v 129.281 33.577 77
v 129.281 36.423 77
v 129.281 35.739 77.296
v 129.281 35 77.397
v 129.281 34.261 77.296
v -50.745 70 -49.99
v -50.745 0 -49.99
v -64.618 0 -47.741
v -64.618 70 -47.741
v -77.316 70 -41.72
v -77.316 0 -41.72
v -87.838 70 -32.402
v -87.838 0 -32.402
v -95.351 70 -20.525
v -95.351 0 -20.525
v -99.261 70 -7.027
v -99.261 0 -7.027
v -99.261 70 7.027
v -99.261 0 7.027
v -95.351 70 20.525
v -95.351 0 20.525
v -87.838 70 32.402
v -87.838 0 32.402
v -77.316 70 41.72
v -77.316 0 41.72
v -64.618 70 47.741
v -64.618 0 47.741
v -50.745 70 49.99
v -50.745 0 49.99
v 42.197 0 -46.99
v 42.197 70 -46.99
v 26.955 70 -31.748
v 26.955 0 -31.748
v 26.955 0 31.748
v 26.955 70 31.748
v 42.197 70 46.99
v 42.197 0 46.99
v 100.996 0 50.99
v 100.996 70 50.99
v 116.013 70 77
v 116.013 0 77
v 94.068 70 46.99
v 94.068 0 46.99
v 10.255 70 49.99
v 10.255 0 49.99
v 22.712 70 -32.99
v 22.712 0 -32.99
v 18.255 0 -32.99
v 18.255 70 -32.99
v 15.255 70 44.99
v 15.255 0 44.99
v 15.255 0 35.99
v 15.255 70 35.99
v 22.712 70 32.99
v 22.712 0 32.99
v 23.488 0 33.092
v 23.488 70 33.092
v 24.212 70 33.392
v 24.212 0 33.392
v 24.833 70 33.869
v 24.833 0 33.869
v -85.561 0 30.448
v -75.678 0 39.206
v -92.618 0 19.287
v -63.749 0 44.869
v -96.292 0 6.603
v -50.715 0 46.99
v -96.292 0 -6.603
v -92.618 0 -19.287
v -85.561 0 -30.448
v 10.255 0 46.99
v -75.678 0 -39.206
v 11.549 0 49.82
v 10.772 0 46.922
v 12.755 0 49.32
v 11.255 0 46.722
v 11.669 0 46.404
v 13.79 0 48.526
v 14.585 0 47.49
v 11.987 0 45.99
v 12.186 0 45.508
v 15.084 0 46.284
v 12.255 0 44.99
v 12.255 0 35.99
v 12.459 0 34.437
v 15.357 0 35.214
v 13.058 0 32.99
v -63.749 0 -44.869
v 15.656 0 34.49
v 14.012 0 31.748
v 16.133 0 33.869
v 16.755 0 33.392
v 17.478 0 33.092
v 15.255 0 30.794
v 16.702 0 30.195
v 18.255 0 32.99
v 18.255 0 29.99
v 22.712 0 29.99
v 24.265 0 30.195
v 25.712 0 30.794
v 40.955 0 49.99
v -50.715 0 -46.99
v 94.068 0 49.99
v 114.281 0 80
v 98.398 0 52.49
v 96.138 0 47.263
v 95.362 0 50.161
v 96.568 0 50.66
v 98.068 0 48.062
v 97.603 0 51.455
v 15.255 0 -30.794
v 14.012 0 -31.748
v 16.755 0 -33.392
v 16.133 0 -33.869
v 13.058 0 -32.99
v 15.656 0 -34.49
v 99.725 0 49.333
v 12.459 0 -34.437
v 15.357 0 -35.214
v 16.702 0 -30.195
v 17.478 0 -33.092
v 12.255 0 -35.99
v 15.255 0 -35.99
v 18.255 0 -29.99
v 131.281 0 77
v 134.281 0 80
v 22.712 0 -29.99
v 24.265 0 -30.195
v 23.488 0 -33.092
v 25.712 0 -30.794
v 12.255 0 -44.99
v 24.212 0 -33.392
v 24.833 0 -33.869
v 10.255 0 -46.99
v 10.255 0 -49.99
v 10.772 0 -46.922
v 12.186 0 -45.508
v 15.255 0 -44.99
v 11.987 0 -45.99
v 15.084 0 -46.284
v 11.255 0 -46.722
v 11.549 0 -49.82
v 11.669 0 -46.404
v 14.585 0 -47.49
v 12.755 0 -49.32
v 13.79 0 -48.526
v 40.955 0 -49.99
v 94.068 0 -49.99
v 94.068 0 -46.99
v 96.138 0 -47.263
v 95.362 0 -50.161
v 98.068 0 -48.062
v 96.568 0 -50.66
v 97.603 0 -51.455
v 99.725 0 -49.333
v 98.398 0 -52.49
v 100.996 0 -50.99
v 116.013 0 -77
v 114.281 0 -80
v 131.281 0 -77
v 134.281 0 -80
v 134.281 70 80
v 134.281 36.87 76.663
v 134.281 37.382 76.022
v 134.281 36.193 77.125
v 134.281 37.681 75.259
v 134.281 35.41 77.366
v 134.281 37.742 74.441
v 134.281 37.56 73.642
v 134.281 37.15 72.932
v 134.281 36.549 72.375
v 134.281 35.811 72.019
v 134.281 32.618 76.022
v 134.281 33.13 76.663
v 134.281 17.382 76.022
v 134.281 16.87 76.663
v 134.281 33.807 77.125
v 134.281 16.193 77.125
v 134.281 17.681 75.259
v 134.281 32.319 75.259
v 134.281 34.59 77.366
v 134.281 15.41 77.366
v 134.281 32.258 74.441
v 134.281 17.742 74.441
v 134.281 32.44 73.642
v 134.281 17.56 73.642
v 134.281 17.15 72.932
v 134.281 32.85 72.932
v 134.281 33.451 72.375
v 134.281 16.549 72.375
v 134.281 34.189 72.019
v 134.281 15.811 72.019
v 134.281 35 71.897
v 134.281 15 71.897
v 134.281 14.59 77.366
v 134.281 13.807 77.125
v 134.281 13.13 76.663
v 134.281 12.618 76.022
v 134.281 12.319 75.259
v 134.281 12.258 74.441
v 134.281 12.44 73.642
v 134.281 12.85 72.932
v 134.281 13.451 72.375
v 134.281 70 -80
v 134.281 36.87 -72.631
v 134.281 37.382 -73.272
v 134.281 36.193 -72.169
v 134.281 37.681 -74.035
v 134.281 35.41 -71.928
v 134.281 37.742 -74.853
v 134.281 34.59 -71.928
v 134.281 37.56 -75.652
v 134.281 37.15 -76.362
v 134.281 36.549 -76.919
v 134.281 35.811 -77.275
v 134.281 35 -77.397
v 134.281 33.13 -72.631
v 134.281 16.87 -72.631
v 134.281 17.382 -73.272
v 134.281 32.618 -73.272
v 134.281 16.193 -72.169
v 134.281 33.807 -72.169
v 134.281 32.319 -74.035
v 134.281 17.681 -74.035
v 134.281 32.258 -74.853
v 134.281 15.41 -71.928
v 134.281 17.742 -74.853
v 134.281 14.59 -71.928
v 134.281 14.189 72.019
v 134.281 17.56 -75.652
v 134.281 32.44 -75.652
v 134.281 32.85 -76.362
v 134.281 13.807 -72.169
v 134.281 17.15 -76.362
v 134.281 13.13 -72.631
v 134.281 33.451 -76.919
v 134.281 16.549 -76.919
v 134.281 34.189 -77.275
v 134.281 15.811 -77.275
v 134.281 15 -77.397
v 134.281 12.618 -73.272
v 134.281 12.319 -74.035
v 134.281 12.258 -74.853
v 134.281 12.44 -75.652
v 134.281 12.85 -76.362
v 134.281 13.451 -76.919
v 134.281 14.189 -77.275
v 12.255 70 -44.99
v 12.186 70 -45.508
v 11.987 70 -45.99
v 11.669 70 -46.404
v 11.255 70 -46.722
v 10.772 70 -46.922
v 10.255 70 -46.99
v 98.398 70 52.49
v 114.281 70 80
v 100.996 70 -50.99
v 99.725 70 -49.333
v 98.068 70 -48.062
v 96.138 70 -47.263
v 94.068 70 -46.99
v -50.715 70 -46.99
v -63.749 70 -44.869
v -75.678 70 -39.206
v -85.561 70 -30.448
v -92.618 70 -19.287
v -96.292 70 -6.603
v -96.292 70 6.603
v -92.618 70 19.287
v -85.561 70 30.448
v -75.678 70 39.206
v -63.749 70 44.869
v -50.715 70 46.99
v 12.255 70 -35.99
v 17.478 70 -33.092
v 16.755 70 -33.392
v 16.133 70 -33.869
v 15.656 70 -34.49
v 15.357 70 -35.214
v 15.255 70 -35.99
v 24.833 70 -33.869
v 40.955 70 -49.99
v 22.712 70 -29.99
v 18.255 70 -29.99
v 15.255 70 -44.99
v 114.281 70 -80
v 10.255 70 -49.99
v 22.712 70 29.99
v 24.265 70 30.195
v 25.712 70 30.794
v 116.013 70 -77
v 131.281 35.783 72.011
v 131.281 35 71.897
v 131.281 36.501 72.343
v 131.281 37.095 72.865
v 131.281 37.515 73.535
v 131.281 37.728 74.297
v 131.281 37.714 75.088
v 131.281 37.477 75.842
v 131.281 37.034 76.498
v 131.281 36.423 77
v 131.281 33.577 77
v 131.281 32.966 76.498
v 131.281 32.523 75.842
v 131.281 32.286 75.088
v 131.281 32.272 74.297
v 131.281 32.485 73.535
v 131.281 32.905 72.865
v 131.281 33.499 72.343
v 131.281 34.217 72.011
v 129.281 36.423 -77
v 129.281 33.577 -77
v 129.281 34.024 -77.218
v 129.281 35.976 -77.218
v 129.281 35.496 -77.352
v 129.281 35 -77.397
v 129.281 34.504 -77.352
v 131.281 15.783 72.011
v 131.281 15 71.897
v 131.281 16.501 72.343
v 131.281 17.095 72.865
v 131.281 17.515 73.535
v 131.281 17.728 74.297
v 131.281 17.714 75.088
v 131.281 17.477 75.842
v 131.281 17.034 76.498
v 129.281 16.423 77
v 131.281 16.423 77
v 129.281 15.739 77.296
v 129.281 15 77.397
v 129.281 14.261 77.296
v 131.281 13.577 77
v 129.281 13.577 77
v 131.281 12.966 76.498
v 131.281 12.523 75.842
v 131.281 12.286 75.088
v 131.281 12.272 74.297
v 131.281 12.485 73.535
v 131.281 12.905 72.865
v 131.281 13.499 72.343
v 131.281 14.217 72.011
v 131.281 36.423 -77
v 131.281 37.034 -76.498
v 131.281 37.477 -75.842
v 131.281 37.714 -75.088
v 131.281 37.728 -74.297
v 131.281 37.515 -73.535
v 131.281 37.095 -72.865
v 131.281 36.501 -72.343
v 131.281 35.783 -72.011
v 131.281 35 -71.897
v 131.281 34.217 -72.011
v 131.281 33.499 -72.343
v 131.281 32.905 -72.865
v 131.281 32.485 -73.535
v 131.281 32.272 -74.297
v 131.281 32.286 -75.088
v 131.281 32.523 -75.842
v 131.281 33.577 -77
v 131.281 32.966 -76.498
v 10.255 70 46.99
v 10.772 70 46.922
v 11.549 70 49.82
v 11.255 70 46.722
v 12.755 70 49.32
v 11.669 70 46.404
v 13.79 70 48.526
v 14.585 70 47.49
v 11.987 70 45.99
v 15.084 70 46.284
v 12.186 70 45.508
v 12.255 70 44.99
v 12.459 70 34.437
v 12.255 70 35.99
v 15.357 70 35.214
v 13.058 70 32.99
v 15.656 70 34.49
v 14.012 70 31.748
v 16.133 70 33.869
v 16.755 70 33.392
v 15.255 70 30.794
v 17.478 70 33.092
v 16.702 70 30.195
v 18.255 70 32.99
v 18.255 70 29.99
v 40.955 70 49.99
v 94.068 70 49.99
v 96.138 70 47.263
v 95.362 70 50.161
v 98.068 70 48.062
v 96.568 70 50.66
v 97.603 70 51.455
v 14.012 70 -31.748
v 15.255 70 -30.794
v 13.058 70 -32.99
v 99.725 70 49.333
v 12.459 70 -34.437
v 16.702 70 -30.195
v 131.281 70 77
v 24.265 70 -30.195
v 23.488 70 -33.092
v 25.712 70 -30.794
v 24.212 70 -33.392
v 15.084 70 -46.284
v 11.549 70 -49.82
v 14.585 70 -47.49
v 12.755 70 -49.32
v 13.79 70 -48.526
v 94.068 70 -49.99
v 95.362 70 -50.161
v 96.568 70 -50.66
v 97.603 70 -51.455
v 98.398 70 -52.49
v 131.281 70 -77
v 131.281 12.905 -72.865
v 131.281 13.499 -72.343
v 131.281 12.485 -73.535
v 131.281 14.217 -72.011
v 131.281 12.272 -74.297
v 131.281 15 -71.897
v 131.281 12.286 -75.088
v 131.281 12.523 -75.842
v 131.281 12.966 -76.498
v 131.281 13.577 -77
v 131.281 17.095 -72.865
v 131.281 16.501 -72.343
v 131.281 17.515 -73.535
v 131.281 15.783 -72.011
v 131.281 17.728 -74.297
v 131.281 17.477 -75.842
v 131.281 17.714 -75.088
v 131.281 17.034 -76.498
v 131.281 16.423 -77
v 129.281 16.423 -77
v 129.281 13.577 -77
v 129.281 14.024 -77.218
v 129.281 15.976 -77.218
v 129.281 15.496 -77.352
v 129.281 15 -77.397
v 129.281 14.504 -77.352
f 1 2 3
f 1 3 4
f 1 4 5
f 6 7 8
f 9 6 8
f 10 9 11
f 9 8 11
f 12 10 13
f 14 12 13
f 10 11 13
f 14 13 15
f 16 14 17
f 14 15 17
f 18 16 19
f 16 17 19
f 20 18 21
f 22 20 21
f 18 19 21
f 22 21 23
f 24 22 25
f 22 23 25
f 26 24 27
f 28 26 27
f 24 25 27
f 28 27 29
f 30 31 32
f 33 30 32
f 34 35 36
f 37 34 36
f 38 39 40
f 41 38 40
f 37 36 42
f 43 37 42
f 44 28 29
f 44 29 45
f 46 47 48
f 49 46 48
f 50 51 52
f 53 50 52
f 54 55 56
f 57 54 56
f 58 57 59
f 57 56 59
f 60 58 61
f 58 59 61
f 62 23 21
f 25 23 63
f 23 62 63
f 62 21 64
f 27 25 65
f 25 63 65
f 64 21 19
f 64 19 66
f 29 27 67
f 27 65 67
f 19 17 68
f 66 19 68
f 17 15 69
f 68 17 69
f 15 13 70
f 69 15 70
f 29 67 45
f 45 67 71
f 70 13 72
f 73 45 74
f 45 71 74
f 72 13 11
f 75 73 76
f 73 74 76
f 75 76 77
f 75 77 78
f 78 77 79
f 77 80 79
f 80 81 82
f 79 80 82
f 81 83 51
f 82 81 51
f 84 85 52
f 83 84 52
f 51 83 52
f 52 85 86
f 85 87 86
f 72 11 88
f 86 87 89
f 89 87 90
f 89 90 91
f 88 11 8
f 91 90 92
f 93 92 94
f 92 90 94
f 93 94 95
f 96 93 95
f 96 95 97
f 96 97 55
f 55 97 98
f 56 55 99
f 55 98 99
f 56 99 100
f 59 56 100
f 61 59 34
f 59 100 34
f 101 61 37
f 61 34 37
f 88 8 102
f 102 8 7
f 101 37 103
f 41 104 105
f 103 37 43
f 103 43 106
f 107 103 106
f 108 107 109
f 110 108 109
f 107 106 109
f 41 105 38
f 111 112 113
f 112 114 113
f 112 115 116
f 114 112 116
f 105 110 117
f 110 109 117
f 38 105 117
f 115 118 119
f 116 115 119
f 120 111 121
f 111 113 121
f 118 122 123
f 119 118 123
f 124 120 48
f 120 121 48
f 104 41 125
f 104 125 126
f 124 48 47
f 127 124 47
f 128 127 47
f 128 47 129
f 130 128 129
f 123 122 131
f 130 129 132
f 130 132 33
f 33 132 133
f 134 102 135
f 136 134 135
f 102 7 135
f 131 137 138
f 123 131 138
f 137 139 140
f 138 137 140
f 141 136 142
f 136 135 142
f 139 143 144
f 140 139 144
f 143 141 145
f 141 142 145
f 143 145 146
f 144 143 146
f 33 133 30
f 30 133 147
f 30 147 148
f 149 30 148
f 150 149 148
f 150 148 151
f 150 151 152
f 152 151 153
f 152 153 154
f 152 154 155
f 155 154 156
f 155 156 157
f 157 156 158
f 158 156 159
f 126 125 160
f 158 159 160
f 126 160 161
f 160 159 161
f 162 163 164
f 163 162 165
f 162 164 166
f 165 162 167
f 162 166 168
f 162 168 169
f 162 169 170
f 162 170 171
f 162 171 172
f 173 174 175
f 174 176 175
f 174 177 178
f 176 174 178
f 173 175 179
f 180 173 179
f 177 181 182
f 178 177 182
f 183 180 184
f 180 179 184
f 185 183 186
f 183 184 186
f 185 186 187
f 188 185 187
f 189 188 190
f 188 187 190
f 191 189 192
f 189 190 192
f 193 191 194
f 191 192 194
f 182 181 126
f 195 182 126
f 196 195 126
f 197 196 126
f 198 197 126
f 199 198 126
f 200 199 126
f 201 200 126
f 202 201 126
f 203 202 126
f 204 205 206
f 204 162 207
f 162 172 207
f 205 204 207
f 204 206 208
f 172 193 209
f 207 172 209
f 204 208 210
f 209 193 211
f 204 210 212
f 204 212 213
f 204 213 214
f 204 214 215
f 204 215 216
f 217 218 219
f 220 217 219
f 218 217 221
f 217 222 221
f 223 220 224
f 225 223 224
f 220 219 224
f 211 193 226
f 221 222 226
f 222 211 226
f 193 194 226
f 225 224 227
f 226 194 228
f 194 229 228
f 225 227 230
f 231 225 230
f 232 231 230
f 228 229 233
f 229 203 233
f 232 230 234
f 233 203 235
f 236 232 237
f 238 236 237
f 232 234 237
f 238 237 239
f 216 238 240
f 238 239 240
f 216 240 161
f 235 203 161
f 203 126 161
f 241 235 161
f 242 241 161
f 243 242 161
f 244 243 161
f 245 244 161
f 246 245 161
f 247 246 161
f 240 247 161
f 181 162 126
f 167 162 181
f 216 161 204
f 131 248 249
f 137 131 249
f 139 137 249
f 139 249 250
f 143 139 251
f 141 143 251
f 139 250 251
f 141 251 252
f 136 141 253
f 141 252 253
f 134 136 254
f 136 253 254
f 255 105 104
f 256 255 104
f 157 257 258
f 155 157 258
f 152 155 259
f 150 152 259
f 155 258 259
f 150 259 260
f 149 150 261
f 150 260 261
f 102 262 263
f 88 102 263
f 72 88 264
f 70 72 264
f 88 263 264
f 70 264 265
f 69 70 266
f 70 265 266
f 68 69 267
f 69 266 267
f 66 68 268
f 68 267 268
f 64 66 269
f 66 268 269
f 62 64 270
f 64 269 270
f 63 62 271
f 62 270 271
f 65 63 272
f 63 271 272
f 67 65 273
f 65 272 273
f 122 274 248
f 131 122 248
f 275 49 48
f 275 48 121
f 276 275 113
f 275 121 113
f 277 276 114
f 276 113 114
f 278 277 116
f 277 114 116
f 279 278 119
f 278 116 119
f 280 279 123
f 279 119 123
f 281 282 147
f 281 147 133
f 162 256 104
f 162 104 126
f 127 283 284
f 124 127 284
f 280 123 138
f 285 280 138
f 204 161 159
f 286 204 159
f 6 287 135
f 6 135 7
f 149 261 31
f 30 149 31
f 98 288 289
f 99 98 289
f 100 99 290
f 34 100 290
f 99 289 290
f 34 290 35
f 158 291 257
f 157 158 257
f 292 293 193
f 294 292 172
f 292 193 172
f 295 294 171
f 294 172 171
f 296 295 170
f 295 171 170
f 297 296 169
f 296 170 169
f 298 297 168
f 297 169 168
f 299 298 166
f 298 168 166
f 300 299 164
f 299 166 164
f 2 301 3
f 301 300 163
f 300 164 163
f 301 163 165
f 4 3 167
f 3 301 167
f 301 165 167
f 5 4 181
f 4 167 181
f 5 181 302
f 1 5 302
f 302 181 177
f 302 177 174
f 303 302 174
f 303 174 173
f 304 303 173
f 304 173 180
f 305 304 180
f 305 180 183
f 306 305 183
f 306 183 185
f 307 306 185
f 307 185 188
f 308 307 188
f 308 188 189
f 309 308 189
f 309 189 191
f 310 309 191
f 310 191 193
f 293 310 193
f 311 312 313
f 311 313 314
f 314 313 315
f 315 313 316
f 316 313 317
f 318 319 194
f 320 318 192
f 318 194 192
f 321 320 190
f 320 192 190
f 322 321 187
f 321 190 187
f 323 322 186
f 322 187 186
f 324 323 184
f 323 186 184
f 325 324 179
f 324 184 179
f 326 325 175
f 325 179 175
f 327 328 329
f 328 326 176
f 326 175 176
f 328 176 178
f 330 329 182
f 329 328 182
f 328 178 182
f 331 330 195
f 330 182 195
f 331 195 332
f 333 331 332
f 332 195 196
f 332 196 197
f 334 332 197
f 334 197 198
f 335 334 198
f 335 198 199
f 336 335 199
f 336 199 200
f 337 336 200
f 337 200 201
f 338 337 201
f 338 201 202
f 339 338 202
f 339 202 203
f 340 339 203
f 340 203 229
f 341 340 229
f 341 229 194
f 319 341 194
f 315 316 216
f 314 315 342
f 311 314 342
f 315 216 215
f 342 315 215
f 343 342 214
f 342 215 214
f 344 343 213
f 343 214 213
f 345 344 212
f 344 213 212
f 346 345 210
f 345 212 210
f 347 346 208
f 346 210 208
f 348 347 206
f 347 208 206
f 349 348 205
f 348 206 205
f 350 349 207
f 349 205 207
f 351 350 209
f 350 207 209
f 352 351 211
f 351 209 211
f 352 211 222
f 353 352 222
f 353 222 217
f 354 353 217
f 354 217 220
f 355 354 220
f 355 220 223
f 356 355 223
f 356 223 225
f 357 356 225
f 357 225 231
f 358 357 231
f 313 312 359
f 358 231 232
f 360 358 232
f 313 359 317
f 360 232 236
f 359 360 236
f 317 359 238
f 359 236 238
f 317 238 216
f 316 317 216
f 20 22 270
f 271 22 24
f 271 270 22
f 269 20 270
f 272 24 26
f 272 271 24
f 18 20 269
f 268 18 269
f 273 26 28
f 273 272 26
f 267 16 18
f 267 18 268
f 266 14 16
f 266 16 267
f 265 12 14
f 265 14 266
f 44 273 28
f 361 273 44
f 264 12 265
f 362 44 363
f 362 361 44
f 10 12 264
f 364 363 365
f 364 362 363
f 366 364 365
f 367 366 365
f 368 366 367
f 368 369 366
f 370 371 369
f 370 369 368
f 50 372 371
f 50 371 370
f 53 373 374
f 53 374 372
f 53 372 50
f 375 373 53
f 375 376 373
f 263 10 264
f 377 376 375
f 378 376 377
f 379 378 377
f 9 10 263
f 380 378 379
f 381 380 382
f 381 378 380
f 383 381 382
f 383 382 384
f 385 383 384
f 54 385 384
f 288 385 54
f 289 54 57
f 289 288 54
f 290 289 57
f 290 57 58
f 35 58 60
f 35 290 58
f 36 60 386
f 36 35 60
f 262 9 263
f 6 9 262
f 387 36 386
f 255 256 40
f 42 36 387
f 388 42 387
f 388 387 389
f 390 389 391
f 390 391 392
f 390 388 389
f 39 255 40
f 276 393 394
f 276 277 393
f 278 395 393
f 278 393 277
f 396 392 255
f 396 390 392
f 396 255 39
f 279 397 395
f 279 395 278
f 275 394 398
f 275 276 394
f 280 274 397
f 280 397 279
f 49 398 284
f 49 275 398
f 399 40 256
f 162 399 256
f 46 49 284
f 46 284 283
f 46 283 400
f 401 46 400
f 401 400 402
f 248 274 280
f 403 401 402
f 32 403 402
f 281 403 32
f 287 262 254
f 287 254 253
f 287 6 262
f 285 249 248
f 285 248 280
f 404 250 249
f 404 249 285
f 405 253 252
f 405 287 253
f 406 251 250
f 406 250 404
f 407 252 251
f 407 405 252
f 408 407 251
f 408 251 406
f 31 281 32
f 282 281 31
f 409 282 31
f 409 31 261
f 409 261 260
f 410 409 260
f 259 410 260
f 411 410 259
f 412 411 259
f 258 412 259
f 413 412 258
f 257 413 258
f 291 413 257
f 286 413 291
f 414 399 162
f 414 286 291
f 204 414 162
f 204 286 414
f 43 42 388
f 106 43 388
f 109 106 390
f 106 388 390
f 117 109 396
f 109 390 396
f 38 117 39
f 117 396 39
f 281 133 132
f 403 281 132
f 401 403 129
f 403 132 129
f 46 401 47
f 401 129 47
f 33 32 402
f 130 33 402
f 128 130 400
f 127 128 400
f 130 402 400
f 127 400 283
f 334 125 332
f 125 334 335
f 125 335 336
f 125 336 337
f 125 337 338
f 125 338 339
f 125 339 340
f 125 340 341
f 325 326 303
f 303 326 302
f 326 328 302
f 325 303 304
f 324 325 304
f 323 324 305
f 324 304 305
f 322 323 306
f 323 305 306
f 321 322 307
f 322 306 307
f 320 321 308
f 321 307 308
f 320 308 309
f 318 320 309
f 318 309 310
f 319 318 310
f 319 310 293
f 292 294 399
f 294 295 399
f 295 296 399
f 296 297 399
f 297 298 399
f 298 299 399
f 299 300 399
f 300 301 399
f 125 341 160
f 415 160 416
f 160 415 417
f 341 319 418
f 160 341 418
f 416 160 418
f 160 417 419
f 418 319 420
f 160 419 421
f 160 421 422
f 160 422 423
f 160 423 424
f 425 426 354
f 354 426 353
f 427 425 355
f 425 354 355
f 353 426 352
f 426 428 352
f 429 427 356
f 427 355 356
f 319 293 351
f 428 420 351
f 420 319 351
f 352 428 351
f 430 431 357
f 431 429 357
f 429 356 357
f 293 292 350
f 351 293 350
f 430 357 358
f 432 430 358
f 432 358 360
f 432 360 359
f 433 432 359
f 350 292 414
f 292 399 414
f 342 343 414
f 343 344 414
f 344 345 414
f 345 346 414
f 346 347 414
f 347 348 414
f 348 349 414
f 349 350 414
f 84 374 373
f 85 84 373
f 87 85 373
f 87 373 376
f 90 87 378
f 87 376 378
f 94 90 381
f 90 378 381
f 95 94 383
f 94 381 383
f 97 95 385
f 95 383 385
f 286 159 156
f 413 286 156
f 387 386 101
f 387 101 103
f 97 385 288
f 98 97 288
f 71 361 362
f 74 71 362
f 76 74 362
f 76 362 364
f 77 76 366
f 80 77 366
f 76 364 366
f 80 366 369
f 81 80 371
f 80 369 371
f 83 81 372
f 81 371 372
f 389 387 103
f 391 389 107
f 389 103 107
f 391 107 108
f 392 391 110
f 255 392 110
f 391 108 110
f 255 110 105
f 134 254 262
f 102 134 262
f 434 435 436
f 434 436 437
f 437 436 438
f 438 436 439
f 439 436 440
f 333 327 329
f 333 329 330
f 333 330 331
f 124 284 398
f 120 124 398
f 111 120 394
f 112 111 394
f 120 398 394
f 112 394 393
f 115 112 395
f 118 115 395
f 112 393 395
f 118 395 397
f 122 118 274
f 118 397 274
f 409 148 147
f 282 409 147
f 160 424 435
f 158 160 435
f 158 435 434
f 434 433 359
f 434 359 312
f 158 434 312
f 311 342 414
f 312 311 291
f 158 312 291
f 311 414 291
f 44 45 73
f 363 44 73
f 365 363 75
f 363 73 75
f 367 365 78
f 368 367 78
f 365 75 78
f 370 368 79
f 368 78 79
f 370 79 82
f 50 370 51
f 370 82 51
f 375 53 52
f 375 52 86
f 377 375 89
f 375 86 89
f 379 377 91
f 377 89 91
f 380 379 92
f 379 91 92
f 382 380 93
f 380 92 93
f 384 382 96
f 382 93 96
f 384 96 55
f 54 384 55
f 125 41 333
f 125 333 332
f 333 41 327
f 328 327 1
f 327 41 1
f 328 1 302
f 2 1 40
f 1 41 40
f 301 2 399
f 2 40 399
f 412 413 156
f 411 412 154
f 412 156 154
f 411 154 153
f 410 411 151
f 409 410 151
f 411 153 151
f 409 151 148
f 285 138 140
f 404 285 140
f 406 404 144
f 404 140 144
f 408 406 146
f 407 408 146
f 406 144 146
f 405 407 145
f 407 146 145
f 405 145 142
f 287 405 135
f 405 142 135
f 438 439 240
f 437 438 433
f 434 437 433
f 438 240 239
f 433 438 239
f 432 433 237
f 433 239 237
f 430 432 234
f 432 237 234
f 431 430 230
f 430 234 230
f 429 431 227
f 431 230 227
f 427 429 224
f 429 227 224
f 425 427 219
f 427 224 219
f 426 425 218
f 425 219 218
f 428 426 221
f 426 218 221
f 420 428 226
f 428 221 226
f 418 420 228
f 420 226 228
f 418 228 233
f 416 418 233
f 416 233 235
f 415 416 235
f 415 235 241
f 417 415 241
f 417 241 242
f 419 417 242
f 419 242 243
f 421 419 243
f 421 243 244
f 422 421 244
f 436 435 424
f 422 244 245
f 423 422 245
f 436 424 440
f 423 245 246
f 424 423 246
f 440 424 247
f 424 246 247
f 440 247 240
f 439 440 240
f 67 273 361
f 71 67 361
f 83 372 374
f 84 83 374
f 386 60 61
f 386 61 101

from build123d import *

# Parameters (mm, degrees)
BOSS_EXTRUDE1_DEPTH = 70
CUT_EXTRUDE3_DEPTH  = 70
SKETCH3_R           = 2.75
CUT_EXTRUDE6_DEPTH  = 5


with BuildPart() as part:
    # Sketch1 → Boss-Extrude1 (new body)
    with BuildSketch(Plane(origin=(0, 0, 0), x_dir=(1, 0, 0), z_dir=(0, 1, 0))):
        with BuildLine():
            Line((15.254575611, 35.990242765), (15.254575611, 44.990242765))
            ThreePointArc((15.254575611, 44.990242765), (13.790109517, 48.525776671), (10.254575611, 49.990242765))
            Line((10.254575611, 49.990242765), (-50.745424389, 49.990242765))
            ThreePointArc((-50.745424389, 49.990242765), (-99.757685432, 0), (-50.745424389, -49.990242765))
            Line((-50.745424389, -49.990242765), (10.254575611, -49.990242765))
            ThreePointArc((10.254575611, -49.990242765), (13.790109517, -48.525776671), (15.254575611, -44.990242765))
            Line((15.254575611, -44.990242765), (15.254575611, -35.990242765))
            ThreePointArc((15.254575611, -35.990242765), (16.133255268, -33.868922422), (18.254575611, -32.990242765))
            Line((18.254575611, -32.990242765), (22.711934924, -32.990242765))
            ThreePointArc((22.711934924, -32.990242765), (23.859985221, -33.218604168), (24.833255268, -33.868922422))
            Line((24.833255268, -33.868922422), (40.954575611, -49.990242765))
            Line((40.954575611, -49.990242765), (50.745424389, -49.990242765))
            Line((50.745424389, -49.990242765), (94.067824265, -49.990242765))
            ThreePointArc((94.067824265, -49.990242765), (96.567824265, -50.660115747), (98.397951284, -52.490242765))
            Line((98.397951284, -52.490242765), (114.280717029, -80))
            Line((114.280717029, -80), (134.280717029, -80))
            Line((134.280717029, -80), (134.280717029, 80))
            Line((134.280717029, 80), (114.280717029, 80))
            Line((114.280717029, 80), (98.397951284, 52.490242765))
            ThreePointArc((98.397951284, 52.490242765), (96.567824265, 50.660115747), (94.067824265, 49.990242765))
            Line((94.067824265, 49.990242765), (50.745424389, 49.990242765))
            Line((50.745424389, 49.990242765), (40.954575611, 49.990242765))
            Line((40.954575611, 49.990242765), (24.833255268, 33.868922422))
            ThreePointArc((24.833255268, 33.868922422), (23.859985221, 33.218604168), (22.711934924, 32.990242765))
            Line((22.711934924, 32.990242765), (18.254575611, 32.990242765))
            ThreePointArc((18.254575611, 32.990242765), (16.133255268, 33.868922422), (15.254575611, 35.990242765))
        make_face()
    extrude(amount=BOSS_EXTRUDE1_DEPTH)

    # Sketch5 → Cut-Extrude3 (cut)
    with BuildSketch(Plane(origin=(0, 70, 0), x_dir=(1, 0, 0), z_dir=(0, 1, 0))):
        with BuildLine():
            Line((116.012767836, 77), (100.996027496, 50.990242765))
            ThreePointArc((100.996027496, 50.990242765), (98.067824265, 48.062039535), (94.067824265, 46.990242765))
            Line((94.067824265, 46.990242765), (42.197216298, 46.990242765))
            Line((42.197216298, 46.990242765), (26.954575611, 31.747602078))
            ThreePointArc((26.954575611, 31.747602078), (25.008035518, 30.44696557), (22.711934924, 29.990242765))
            Line((22.711934924, 29.990242765), (18.254575611, 29.990242765))
            ThreePointArc((18.254575611, 29.990242765), (14.011934924, 31.747602078), (12.254575611, 35.990242765))
            Line((12.254575611, 35.990242765), (12.254575611, 44.990242765))
            ThreePointArc((12.254575611, 44.990242765), (11.668789174, 46.404456328), (10.254575611, 46.990242765))
            Line((10.254575611, 46.990242765), (-50.715330899, 46.990242765))
            ThreePointArc((-50.715330899, 46.990242765), (-96.757685432, 0), (-50.715330899, -46.990242765))
            Line((-50.715330899, -46.990242765), (10.254575611, -46.990242765))
            ThreePointArc((10.254575611, -46.990242765), (11.668789174, -46.404456328), (12.254575611, -44.990242765))
            Line((12.254575611, -44.990242765), (12.254575611, -35.990242765))
            ThreePointArc((12.254575611, -35.990242765), (14.011934924, -31.747602078), (18.254575611, -29.990242765))
            Line((18.254575611, -29.990242765), (22.711934924, -29.990242765))
            ThreePointArc((22.711934924, -29.990242765), (25.008035518, -30.44696557), (26.954575611, -31.747602078))
            Line((26.954575611, -31.747602078), (42.197216298, -46.990242765))
            Line((42.197216298, -46.990242765), (94.067824265, -46.990242765))
            ThreePointArc((94.067824265, -46.990242765), (98.067824265, -48.062039535), (100.996027496, -50.990242765))
            Line((100.996027496, -50.990242765), (116.012767836, -77))
            Line((116.012767836, -77), (131.280717029, -77))
            Line((131.280717029, -77), (131.280717029, 77))
            Line((131.280717029, 77), (116.012767836, 77))
        make_face()
    extrude(amount=-CUT_EXTRUDE3_DEPTH, mode=Mode.SUBTRACT)

    # Sketch3 → Cut-Extrude6 (cut)
    with BuildSketch(Plane(origin=(134.280717029, 0, 0), x_dir=(0, 0, -1), z_dir=(1, 0, 0))):
        with Locations((-74.64699859, 15)):
            Circle(SKETCH3_R)
        with Locations((-74.64699859, 35)):
            Circle(SKETCH3_R)
        with Locations((74.64699859, 35)):
            Circle(SKETCH3_R)
        with Locations((74.64699859, 15)):
            Circle(SKETCH3_R)
    extrude(amount=-CUT_EXTRUDE6_DEPTH, mode=Mode.SUBTRACT)


solid = part.part
